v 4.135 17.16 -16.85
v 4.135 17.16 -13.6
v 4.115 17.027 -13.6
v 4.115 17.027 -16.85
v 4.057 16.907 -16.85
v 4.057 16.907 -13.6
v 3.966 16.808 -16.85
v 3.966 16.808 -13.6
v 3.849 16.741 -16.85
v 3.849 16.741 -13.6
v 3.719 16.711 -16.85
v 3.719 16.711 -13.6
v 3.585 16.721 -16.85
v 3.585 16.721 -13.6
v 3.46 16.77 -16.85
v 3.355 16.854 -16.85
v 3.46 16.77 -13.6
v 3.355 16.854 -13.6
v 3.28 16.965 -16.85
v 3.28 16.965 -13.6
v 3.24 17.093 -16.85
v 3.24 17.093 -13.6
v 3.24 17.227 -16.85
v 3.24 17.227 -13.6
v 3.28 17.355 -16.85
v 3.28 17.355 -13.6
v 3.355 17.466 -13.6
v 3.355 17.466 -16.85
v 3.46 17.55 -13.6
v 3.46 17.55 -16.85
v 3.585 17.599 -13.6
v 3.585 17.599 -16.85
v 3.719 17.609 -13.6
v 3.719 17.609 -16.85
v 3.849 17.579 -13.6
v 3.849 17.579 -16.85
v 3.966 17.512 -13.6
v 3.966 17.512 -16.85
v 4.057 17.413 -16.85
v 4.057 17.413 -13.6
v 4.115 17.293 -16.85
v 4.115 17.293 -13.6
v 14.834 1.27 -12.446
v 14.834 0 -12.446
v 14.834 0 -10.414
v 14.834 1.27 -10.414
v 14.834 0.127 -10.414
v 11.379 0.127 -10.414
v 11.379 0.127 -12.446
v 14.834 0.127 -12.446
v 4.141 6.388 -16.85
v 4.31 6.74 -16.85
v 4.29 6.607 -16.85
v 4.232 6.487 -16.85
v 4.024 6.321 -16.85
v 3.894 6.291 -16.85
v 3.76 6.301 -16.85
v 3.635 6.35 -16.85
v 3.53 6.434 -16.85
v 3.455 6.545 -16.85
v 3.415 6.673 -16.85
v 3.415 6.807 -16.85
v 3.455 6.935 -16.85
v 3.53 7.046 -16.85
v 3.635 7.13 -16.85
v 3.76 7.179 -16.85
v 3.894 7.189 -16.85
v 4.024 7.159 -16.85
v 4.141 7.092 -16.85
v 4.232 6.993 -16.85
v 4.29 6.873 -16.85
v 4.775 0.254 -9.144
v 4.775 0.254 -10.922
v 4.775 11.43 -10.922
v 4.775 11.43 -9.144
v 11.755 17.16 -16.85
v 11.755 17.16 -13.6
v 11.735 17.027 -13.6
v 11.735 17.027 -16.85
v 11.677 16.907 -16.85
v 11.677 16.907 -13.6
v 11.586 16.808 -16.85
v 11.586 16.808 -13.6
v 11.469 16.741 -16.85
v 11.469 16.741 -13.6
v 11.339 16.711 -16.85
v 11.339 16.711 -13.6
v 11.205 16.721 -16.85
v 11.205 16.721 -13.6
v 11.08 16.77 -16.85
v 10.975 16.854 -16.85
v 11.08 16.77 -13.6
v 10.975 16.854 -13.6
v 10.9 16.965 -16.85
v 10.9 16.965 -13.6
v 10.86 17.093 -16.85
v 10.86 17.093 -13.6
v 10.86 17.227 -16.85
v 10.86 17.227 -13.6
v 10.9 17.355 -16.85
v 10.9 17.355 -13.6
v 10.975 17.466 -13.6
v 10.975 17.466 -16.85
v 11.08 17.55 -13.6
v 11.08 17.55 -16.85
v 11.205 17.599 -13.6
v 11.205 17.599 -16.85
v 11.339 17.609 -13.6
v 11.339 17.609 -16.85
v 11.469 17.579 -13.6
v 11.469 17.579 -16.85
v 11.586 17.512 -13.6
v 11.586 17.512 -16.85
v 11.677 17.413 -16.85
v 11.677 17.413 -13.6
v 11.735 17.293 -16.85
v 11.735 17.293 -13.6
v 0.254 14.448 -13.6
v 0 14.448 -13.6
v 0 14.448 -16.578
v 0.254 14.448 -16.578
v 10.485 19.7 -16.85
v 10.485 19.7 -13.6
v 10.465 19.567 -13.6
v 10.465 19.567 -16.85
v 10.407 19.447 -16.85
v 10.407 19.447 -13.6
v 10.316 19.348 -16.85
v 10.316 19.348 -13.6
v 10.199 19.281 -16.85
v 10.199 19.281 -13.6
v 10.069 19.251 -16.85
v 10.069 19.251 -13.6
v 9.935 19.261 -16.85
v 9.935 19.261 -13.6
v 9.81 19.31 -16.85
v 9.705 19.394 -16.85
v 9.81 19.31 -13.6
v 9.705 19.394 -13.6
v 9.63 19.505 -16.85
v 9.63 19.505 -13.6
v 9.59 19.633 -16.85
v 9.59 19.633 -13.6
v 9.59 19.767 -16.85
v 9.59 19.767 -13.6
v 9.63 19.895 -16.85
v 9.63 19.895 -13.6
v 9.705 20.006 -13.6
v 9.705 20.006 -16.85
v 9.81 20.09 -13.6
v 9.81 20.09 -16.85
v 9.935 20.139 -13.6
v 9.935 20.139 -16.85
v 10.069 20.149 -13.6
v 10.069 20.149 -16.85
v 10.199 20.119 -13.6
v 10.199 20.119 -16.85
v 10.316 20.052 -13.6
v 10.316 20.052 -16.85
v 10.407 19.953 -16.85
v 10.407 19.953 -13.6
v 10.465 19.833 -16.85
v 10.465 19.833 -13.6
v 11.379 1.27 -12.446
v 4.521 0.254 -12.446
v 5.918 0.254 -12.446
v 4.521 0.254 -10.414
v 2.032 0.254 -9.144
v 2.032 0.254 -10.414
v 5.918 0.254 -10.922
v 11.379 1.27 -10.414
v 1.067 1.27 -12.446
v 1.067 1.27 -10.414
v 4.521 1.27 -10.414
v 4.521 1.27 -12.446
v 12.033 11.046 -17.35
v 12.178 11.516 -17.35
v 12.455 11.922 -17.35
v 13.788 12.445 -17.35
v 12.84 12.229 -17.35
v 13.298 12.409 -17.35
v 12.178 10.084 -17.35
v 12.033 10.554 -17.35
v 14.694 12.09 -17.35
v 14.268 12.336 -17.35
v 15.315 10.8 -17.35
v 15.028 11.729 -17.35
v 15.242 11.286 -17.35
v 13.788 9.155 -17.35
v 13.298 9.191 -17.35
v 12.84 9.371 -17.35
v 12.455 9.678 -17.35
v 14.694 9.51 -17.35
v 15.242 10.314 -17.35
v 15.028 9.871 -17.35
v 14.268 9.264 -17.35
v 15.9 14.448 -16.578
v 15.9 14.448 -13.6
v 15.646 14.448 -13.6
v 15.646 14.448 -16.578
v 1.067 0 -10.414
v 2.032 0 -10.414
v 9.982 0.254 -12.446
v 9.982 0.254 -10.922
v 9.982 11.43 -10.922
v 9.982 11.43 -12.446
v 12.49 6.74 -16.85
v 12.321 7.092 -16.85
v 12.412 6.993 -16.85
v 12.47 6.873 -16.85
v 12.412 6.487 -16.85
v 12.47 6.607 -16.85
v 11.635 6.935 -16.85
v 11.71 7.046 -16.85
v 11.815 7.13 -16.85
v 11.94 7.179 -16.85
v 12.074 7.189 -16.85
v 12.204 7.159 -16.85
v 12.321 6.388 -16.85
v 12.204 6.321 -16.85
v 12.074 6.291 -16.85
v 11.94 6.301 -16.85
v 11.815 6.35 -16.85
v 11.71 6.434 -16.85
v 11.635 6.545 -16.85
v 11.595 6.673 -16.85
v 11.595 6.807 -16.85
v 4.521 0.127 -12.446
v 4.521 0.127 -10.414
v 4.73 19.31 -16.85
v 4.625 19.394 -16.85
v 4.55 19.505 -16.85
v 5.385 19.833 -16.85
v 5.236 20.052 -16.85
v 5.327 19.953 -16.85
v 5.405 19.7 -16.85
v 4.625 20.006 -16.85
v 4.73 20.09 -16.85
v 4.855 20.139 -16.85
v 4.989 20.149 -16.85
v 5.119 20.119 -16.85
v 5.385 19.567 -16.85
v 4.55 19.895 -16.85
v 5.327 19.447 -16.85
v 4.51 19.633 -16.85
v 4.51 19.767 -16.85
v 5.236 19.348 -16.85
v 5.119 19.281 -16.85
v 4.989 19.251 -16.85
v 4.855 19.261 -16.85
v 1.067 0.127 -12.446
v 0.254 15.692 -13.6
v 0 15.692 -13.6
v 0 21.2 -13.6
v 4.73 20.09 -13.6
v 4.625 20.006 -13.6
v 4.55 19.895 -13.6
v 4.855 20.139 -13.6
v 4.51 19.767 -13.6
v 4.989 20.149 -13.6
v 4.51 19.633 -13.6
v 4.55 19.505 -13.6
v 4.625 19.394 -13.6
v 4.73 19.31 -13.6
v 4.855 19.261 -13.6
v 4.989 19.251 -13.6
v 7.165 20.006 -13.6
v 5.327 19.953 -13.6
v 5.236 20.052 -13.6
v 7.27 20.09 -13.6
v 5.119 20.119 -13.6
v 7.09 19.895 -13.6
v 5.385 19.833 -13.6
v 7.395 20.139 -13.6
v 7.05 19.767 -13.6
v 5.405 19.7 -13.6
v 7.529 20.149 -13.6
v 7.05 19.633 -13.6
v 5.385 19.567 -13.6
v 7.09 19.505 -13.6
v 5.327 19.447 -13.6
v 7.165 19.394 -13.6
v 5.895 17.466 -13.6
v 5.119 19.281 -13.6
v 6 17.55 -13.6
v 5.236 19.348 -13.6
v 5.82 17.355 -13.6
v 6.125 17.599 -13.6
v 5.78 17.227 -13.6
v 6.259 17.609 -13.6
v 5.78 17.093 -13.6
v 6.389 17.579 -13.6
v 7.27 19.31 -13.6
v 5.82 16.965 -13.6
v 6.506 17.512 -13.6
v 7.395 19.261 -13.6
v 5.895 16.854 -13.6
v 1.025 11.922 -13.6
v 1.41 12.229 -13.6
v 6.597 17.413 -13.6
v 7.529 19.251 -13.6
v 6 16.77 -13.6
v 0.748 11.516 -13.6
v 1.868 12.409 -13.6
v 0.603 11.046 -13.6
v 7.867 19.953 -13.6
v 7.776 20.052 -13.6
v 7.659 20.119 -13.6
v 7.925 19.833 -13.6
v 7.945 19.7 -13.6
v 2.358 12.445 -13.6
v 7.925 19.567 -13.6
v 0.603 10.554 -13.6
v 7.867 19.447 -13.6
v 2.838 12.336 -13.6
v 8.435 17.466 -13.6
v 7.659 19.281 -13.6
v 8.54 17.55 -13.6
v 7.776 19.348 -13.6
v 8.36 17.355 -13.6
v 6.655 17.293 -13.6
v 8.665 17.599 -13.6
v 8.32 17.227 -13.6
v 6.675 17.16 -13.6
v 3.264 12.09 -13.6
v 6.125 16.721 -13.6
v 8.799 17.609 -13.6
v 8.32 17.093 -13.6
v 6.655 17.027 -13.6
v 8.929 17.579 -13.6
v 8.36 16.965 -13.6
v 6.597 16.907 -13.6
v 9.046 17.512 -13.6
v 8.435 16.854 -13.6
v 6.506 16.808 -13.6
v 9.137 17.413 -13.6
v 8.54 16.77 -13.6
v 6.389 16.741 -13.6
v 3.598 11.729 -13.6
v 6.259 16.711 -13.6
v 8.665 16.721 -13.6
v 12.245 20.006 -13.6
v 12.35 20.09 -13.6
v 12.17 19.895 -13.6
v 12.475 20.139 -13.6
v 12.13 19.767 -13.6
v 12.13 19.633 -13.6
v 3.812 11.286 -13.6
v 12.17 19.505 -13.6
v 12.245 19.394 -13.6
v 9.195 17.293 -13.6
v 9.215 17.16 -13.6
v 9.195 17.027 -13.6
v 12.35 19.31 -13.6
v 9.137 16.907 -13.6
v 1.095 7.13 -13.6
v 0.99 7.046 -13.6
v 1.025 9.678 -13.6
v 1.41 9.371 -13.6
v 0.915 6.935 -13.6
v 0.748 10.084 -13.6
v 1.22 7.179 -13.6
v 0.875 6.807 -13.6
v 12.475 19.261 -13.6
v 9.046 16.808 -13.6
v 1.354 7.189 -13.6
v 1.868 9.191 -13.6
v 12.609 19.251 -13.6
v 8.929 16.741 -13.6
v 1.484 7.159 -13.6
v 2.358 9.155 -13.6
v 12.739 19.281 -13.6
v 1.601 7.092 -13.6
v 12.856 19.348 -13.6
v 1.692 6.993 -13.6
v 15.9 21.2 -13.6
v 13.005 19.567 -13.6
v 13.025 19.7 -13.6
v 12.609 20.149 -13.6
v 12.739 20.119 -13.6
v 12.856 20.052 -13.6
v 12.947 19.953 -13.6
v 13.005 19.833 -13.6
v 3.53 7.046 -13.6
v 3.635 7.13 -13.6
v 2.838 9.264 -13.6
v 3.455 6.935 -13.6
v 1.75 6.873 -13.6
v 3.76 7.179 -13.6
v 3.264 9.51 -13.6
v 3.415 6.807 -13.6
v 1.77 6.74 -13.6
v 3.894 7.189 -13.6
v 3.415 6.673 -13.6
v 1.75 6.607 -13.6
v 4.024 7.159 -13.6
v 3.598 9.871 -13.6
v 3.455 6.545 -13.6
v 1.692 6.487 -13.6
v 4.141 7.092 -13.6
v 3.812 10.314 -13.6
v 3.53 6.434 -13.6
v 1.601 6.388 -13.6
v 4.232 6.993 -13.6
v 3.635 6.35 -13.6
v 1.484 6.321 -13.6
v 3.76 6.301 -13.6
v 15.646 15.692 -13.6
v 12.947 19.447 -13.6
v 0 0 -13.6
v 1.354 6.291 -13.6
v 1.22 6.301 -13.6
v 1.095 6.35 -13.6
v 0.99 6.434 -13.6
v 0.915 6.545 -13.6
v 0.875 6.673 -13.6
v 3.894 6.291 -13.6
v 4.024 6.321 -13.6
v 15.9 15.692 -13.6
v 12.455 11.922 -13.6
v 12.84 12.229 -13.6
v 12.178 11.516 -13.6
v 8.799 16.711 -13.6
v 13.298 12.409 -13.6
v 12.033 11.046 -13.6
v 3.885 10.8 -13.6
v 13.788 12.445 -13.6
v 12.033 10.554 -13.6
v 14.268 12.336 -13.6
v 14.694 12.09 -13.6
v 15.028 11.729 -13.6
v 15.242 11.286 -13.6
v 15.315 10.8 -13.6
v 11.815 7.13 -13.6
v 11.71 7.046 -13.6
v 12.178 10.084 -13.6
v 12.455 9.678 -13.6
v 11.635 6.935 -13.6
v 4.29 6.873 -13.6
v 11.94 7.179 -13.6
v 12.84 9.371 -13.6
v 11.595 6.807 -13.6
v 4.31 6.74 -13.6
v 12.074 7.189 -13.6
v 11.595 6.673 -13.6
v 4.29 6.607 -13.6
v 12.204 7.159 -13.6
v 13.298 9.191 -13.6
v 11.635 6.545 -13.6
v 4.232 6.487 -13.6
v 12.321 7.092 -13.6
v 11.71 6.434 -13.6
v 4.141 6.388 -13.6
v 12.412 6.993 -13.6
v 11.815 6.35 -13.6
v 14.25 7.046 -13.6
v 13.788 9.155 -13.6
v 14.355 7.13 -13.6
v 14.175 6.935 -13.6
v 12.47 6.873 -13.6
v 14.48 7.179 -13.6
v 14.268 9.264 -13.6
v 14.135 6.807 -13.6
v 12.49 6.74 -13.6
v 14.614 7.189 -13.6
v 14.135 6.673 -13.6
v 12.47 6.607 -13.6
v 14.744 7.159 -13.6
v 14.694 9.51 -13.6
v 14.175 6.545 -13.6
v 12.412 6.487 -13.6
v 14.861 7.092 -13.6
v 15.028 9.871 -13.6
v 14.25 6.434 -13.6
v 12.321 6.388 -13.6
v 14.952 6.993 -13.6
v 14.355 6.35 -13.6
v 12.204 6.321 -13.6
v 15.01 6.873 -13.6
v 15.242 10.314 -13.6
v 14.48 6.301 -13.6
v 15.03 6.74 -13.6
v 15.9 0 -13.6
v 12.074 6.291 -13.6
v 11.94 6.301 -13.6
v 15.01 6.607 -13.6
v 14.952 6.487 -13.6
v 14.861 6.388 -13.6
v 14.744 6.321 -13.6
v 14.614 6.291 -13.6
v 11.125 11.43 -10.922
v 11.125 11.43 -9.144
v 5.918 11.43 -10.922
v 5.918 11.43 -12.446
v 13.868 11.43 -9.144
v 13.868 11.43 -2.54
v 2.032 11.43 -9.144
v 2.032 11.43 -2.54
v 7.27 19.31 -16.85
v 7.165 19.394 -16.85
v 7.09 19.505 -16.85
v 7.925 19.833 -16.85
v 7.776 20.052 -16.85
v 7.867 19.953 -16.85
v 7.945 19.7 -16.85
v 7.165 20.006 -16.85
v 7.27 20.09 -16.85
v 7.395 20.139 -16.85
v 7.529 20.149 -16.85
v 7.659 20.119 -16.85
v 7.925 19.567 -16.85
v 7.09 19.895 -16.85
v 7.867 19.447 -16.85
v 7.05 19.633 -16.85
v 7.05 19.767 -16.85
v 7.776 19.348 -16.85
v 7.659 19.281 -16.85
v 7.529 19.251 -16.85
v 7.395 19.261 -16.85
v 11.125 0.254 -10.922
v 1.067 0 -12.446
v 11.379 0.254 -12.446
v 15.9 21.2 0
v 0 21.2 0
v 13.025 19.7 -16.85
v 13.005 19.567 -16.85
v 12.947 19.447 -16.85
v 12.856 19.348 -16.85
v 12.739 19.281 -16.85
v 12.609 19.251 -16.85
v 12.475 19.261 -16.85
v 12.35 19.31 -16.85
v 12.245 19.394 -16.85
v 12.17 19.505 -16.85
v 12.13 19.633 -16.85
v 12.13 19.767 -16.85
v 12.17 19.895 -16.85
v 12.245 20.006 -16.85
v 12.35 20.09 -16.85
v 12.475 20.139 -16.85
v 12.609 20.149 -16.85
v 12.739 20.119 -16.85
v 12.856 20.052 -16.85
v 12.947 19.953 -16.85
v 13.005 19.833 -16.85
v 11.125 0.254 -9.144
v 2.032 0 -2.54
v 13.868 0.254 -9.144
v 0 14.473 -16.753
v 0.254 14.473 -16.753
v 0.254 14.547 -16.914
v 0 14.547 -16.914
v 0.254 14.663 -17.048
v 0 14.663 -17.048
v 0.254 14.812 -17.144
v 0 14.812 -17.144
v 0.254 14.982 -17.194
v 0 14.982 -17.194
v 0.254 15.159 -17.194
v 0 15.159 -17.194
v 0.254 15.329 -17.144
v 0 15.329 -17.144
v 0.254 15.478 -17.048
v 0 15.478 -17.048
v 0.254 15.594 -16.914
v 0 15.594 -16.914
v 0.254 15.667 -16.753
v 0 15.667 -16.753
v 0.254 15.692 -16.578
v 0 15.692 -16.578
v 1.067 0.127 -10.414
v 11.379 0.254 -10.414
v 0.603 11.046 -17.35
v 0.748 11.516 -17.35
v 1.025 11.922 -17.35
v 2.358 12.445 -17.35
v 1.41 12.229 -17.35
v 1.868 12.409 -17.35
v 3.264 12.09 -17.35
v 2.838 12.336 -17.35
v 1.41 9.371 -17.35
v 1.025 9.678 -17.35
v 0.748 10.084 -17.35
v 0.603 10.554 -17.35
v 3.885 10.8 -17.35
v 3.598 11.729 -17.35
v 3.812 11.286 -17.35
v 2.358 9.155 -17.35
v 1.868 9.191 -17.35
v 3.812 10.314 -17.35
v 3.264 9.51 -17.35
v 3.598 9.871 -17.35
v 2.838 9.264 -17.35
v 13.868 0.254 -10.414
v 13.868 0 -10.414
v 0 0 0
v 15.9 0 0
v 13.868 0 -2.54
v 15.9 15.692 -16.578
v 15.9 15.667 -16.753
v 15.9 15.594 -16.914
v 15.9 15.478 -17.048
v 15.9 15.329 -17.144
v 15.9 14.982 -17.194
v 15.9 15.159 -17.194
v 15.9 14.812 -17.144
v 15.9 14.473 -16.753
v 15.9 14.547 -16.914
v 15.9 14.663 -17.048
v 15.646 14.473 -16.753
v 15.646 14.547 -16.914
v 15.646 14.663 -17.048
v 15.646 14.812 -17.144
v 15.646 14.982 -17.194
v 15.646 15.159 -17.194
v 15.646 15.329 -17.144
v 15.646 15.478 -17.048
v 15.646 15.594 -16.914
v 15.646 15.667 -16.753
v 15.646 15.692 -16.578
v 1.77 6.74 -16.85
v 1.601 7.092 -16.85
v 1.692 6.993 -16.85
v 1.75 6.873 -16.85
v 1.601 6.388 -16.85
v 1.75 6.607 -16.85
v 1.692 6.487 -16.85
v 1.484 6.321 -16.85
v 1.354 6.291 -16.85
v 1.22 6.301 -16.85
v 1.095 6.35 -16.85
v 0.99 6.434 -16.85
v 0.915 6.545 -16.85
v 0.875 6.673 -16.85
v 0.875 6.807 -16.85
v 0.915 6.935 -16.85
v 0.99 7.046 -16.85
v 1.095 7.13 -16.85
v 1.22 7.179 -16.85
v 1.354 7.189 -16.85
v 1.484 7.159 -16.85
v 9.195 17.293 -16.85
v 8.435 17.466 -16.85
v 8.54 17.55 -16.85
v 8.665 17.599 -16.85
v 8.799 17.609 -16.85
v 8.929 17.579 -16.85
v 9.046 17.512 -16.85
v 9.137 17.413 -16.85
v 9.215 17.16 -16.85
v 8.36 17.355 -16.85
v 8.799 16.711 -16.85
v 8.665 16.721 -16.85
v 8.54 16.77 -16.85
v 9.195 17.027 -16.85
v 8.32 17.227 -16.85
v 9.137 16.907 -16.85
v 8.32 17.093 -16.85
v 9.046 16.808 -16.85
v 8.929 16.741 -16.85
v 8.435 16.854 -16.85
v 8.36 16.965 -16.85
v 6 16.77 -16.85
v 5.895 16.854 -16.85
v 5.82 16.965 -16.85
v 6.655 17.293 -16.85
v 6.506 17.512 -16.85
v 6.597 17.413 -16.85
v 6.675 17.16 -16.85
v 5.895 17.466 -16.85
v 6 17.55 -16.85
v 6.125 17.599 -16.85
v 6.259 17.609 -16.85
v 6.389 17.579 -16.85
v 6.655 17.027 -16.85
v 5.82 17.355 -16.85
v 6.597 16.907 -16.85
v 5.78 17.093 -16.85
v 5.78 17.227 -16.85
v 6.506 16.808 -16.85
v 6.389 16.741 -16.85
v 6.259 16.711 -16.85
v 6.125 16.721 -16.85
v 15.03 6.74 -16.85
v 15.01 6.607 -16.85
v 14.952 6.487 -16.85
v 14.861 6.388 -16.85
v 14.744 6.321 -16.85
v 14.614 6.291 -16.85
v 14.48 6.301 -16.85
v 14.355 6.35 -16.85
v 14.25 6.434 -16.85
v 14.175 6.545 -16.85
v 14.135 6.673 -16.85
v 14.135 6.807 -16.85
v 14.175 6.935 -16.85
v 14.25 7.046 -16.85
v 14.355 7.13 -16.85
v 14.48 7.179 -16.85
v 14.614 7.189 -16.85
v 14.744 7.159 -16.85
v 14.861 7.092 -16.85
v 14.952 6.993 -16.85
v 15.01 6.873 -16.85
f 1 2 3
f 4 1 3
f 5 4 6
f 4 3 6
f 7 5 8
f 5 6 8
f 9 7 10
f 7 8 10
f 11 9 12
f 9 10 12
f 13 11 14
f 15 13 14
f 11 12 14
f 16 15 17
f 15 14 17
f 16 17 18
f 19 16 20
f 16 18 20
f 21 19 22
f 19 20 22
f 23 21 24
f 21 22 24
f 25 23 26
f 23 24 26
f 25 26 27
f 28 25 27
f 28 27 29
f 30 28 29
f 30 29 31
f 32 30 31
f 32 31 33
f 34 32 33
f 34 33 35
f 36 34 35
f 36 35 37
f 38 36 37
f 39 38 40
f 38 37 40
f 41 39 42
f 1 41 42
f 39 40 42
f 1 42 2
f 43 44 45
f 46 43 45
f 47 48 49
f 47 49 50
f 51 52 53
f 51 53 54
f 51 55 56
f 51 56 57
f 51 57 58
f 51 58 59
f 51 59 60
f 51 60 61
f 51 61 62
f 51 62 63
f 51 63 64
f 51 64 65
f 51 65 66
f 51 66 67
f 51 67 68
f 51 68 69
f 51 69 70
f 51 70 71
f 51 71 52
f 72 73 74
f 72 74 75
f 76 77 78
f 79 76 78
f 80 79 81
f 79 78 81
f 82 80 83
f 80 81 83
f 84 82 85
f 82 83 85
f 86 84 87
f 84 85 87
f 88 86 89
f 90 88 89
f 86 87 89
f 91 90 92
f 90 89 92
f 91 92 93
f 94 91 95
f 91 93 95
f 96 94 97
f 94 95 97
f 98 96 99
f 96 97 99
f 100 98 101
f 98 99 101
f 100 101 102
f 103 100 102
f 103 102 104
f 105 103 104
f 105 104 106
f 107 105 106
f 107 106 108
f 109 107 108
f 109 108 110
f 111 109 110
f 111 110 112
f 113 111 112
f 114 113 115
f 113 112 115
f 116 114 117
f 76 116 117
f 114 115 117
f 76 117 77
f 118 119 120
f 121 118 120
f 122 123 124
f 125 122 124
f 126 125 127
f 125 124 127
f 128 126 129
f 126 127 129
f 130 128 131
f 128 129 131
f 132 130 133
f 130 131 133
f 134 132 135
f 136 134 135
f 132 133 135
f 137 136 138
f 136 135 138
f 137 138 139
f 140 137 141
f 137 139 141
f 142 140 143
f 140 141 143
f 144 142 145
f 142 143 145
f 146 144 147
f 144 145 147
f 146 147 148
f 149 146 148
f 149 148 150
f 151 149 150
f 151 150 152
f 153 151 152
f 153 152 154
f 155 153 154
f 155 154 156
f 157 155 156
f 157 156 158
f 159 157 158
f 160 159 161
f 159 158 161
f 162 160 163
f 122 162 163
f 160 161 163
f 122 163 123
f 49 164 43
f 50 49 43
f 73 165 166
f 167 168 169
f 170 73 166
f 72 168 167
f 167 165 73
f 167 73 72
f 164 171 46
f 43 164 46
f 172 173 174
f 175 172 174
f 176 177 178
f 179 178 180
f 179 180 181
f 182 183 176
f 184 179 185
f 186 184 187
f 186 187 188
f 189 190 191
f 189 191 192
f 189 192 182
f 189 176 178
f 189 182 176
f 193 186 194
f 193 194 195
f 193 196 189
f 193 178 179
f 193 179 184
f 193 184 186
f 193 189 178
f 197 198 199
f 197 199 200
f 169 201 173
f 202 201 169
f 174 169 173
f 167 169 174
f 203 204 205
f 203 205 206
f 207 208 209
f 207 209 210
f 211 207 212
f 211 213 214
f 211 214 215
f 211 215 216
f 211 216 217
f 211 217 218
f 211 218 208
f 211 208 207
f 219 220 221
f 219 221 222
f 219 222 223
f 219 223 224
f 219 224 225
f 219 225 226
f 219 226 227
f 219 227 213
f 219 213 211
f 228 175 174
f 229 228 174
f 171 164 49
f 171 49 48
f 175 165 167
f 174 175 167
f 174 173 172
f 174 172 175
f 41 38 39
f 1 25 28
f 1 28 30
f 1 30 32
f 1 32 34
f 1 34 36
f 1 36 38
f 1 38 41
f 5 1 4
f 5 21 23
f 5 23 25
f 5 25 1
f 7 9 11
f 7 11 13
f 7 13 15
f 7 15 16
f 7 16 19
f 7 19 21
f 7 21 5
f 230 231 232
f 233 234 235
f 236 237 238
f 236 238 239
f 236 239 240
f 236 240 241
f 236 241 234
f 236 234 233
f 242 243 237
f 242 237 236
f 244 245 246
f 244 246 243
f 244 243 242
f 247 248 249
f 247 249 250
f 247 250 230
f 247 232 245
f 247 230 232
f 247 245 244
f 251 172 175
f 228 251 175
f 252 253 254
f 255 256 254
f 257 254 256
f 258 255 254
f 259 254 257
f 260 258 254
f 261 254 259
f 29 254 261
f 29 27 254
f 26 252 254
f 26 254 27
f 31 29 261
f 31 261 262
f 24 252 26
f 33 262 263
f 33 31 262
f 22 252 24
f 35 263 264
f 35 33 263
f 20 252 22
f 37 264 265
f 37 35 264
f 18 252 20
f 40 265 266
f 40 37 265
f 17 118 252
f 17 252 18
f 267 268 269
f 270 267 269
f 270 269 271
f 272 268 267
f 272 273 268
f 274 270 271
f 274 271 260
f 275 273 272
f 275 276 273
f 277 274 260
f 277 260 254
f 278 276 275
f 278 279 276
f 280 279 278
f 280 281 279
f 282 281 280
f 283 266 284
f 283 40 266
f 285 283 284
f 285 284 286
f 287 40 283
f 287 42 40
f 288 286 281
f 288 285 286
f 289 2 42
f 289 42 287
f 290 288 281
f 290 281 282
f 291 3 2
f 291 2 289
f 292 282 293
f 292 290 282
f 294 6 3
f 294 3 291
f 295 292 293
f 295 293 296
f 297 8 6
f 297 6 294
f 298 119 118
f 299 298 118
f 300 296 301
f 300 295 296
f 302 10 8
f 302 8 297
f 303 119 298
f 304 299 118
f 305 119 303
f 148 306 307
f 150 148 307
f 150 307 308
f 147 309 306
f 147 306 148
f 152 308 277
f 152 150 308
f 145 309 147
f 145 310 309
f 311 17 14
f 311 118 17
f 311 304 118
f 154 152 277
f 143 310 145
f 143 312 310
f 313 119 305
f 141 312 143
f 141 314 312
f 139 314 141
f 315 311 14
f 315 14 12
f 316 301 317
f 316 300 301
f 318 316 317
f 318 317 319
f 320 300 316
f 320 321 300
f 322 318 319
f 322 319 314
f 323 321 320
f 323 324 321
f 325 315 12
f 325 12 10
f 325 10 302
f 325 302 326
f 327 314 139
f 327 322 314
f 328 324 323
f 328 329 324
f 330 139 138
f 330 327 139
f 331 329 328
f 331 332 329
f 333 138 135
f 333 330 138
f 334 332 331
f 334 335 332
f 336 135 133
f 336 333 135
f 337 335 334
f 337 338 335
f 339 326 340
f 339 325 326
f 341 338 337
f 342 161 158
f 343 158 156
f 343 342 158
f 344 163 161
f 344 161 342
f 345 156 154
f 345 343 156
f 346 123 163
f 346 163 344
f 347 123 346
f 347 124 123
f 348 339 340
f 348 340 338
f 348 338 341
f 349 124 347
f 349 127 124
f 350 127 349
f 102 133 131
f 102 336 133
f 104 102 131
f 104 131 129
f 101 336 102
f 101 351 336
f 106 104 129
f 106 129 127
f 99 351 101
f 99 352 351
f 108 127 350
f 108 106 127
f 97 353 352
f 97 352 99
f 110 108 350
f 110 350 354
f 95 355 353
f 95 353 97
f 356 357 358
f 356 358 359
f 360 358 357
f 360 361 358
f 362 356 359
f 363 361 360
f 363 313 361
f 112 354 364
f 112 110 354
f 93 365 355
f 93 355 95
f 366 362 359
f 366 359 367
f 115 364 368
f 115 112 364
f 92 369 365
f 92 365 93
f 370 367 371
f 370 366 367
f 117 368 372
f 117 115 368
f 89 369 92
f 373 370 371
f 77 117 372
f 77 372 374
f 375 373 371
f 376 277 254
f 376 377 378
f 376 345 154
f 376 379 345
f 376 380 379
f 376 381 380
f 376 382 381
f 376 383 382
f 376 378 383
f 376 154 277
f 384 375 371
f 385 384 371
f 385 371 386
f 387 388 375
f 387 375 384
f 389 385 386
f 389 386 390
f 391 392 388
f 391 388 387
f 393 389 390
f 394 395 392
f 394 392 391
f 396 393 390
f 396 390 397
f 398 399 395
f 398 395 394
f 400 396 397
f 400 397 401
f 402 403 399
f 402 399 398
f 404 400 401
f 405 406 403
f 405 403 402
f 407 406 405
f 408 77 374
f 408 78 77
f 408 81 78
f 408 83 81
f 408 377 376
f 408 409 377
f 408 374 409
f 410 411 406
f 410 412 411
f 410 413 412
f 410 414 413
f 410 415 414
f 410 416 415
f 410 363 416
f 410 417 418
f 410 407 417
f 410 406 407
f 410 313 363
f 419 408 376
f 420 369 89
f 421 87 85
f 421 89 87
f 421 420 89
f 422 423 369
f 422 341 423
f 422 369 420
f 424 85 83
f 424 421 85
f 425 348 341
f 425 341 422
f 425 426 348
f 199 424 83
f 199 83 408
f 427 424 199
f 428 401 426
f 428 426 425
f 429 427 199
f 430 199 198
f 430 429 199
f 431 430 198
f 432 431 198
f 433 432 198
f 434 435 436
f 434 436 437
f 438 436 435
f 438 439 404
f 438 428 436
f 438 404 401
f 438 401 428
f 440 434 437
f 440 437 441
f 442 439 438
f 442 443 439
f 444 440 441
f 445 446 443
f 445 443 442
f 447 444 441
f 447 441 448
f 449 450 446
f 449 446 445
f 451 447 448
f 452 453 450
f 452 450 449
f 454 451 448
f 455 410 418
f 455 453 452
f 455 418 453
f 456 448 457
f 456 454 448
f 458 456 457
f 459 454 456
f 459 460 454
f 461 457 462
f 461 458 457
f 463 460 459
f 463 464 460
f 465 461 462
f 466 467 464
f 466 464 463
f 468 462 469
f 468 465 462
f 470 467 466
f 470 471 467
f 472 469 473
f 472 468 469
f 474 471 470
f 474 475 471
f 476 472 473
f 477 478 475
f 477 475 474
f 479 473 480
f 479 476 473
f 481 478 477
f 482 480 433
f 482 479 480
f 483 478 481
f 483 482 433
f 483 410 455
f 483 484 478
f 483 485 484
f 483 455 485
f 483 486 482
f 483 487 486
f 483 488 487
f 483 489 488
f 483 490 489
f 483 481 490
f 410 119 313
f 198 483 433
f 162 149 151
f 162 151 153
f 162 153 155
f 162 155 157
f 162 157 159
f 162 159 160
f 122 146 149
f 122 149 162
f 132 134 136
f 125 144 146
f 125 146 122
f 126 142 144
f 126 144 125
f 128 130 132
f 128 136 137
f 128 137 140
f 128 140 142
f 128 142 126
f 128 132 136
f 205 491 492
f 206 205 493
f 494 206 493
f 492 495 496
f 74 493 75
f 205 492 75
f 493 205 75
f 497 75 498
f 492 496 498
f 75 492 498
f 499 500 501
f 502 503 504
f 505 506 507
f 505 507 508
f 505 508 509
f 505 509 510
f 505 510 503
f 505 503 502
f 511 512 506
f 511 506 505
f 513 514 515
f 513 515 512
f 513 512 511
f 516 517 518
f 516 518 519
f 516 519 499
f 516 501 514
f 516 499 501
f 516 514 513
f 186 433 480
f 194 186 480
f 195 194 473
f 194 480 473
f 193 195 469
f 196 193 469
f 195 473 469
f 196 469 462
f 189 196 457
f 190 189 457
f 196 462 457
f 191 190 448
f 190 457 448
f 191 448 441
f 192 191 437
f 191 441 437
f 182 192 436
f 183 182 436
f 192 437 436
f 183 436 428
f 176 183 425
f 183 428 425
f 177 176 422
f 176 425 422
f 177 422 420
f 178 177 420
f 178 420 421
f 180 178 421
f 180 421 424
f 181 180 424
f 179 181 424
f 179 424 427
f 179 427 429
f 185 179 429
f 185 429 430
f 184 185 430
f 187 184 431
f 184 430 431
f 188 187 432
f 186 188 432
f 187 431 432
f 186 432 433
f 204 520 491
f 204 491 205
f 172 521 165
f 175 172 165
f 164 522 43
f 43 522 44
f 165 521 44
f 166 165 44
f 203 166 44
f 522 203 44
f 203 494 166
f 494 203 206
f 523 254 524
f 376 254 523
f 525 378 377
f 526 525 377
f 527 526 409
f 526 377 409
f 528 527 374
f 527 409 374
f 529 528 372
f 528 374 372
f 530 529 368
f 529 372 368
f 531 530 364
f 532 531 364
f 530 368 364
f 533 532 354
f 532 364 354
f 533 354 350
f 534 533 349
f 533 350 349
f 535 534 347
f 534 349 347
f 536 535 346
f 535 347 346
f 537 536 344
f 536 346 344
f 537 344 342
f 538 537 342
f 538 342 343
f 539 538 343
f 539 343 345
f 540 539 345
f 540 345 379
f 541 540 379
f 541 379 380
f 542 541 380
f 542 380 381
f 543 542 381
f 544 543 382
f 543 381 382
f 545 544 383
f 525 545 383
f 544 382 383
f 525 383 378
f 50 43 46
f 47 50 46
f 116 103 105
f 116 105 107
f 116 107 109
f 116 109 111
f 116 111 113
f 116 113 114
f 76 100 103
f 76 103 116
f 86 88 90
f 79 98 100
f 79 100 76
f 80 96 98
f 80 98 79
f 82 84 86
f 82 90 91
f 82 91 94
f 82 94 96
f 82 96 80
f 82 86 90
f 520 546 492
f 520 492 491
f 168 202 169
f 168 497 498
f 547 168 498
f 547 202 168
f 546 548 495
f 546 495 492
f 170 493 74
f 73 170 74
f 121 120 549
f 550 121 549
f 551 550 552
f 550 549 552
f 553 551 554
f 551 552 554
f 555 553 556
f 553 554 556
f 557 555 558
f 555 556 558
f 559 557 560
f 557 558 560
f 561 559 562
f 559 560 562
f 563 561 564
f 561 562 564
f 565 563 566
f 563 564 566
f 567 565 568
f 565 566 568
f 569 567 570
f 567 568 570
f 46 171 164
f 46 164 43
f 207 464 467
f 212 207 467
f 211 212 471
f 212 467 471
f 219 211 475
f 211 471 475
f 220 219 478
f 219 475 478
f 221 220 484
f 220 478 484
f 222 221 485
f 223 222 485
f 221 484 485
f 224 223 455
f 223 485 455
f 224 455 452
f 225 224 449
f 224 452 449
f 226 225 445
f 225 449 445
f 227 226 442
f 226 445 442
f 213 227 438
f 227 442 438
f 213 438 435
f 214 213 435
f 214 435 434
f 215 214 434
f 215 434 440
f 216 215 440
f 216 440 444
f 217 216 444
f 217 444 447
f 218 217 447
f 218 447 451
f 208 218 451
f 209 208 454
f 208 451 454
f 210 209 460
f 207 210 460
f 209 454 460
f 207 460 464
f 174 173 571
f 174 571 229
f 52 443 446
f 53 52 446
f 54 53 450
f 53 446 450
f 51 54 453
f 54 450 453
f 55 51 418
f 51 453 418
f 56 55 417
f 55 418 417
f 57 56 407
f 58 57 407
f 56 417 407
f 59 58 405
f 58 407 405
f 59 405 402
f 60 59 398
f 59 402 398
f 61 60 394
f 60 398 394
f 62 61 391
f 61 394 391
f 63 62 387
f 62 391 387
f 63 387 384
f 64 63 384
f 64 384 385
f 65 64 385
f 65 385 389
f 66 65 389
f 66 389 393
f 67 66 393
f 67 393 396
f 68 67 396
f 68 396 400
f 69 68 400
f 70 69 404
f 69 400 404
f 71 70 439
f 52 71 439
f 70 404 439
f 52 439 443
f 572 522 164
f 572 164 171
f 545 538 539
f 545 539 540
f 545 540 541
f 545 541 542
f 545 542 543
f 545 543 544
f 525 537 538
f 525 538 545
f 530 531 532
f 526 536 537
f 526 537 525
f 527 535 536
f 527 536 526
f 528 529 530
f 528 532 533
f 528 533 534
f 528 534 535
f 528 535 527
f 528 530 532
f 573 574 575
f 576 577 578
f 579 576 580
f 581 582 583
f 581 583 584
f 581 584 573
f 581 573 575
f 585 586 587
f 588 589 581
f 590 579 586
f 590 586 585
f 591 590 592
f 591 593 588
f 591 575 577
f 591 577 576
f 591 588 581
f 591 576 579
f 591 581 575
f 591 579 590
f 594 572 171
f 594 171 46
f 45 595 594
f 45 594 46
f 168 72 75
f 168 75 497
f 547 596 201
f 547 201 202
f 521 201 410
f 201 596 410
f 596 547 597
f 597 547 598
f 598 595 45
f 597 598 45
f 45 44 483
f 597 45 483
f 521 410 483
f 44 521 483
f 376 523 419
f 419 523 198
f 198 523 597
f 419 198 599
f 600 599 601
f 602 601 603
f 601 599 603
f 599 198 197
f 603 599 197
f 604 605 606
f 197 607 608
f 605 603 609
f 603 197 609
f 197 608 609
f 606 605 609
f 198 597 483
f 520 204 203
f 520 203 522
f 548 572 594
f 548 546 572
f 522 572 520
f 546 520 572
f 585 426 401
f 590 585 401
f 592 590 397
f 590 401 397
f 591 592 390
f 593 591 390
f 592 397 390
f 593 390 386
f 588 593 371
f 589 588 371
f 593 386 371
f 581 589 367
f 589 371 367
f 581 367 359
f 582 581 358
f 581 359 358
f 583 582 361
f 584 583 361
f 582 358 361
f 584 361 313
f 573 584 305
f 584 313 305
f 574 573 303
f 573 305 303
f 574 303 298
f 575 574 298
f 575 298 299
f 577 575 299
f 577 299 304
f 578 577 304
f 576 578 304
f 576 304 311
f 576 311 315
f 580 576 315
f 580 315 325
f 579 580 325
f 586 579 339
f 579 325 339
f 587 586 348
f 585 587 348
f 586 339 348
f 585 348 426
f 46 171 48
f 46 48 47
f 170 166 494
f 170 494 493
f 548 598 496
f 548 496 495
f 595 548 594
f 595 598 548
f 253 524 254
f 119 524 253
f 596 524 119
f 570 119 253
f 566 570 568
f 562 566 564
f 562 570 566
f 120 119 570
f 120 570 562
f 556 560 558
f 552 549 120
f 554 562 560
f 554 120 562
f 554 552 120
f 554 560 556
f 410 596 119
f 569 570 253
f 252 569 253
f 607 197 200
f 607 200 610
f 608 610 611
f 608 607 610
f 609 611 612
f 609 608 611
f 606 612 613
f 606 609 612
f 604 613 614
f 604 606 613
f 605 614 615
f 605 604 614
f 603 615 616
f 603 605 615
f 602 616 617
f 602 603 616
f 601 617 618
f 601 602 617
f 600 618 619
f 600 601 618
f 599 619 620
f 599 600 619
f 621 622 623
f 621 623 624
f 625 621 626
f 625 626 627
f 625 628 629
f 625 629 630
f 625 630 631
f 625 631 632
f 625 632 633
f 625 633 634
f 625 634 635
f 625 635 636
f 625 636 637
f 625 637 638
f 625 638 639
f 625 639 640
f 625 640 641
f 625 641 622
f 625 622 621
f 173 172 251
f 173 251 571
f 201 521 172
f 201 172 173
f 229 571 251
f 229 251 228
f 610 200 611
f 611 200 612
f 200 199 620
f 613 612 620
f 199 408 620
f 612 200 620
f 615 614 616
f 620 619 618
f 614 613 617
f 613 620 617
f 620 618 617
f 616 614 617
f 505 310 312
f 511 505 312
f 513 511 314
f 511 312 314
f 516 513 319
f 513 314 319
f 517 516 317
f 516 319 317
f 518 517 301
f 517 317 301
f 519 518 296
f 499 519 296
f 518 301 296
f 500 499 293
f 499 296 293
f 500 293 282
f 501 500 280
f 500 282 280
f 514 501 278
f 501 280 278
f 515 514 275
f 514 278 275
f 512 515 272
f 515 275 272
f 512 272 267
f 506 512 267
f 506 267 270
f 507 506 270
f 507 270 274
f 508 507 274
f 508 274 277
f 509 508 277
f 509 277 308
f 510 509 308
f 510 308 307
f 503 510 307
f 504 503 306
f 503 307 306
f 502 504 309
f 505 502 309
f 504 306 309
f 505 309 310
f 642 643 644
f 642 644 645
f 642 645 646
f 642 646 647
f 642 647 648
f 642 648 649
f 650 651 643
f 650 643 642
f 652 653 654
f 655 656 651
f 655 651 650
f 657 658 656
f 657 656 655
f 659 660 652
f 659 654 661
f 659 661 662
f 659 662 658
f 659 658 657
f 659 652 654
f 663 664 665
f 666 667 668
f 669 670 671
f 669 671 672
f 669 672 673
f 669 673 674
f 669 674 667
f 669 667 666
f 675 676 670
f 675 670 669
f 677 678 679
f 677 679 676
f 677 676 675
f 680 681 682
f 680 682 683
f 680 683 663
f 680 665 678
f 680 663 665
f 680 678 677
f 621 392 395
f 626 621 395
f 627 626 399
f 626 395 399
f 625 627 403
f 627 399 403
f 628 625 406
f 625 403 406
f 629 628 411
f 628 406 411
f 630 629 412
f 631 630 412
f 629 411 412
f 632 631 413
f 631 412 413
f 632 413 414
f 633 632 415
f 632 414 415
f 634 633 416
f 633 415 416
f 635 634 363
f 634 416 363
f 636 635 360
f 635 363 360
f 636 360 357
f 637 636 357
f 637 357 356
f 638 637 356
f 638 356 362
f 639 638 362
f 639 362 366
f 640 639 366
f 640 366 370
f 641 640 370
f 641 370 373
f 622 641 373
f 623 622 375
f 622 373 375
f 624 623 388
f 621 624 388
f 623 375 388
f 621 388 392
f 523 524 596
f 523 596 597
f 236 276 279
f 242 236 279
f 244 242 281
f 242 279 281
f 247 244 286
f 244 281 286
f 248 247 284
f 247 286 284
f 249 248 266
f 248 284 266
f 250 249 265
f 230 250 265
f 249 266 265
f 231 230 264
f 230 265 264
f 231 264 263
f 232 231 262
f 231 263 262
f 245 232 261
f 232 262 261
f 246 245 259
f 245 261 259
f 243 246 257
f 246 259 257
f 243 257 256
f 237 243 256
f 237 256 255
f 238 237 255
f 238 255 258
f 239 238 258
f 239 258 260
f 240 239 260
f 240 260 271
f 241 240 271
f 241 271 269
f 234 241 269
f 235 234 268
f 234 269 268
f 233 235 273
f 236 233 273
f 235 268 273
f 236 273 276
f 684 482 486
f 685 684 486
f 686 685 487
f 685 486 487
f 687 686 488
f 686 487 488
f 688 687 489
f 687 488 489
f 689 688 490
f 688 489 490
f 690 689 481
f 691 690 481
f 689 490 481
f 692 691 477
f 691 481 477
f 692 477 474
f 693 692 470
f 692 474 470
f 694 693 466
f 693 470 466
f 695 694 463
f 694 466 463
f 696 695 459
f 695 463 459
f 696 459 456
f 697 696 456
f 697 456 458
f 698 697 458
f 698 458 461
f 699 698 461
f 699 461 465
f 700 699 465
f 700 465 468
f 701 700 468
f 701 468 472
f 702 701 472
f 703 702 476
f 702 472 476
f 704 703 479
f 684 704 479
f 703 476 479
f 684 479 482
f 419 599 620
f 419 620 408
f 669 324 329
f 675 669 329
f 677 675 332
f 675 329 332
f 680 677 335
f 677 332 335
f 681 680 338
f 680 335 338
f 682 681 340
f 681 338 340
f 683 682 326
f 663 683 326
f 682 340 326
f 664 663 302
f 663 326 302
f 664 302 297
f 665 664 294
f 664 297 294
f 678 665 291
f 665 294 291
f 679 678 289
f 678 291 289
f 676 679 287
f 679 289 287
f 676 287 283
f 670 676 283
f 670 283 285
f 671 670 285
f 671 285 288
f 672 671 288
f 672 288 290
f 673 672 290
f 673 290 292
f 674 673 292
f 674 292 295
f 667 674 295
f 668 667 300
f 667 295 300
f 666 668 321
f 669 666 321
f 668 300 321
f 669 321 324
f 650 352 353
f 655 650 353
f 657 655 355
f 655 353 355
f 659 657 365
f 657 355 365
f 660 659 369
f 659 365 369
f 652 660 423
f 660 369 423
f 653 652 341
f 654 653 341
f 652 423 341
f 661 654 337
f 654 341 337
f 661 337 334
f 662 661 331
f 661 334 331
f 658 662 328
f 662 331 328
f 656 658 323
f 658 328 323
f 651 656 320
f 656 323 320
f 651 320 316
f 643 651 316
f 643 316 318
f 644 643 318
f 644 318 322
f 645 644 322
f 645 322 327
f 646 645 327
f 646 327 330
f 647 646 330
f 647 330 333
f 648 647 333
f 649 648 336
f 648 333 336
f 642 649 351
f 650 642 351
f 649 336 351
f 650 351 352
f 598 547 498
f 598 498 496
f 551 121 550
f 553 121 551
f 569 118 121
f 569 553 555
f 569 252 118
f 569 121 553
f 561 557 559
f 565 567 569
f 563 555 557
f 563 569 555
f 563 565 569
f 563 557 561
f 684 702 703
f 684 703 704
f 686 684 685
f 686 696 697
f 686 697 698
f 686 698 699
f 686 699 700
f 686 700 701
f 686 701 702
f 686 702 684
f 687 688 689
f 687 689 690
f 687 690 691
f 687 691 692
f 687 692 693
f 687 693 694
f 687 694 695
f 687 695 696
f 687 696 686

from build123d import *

# Parameters (mm, degrees)
SKETCH1_W           = 15.9
SKETCH1_H           = 13.6
BOSS_EXTRUDE1_DEPTH = 21.2
SKETCH2_R           = 1.65
BOSS_EXTRUDE2_DEPTH = 3.75
CUT_EXTRUDE1_DEPTH  = 11.43
SKETCH4_W           = 11.8364
SKETCH4_H           = 9.906
CUT_EXTRUDE2_DEPTH  = 0.254
SKETCH7_W           = 3.4544
SKETCH7_H           = 2.032
CUT_EXTRUDE3_DEPTH  = 1.27
SKETCH8_W           = 3.4544
SKETCH8_H           = 2.032
BOSS_EXTRUDE3_DEPTH = 1.143
SKETCH9_W           = 3.4544
SKETCH9_H           = 2.032
BOSS_EXTRUDE4_DEPTH = 1.143
BOSS_EXTRUDE5_DEPTH = 0.254
SKETCH11_R          = 0.45
BOSS_EXTRUDE6_DEPTH = 3.25
SKETCH12_R          = 0.45
BOSS_EXTRUDE7_DEPTH = 3.25


with BuildPart() as part:
    # Sketch1 → Boss-Extrude1 (new body)
    with BuildSketch(Plane(origin=(0, 0, 0), x_dir=(1, 0, 0), z_dir=(0, 1, 0))):
        with Locations((7.95, 6.8)):
            Rectangle(SKETCH1_W, SKETCH1_H)
    extrude(amount=BOSS_EXTRUDE1_DEPTH)

    # Sketch2 → Boss-Extrude2 (add)
    with BuildSketch(Plane(origin=(0, 0, -13.6), x_dir=(-1, 0, 0), z_dir=(0, 0, -1))):
        with Locations(Location((-13.665, 10.8, 0), (0, 0, 180))):
            Circle(SKETCH2_R)
        with Locations(Location((-2.235, 10.8, 0), (0, 0, 180))):
            Circle(SKETCH2_R)
    extrude(amount=BOSS_EXTRUDE2_DEPTH)

    # Sketch3 → Cut-Extrude1 (cut)
    with BuildSketch(Plane.XZ):
        Polygon((2.032, -2.54), (13.8684, -2.54), (13.8684, -9.144), (11.1252, -9.144), (11.1252, -10.922), (9.9822, -10.922), (9.9822, -12.446), (5.9182, -12.446), (5.9182, -10.922), (4.7752, -10.922), (4.7752, -9.144), (2.032, -9.144), align=None)
    extrude(amount=-CUT_EXTRUDE1_DEPTH, mode=Mode.SUBTRACT)

    # Sketch4 → Cut-Extrude2 (cut)
    with BuildSketch(Plane.XZ):
        with Locations((7.9502, -7.493)):
            Rectangle(SKETCH4_W, SKETCH4_H)
    extrude(amount=-CUT_EXTRUDE2_DEPTH, mode=Mode.SUBTRACT)

    # Sketch7 → Cut-Extrude3 (cut)
    with BuildSketch(Plane.XZ):
        with Locations((2.794, -11.43)):
            Rectangle(SKETCH7_W, SKETCH7_H)
        with Locations((13.1064, -11.43)):
            Rectangle(SKETCH7_W, SKETCH7_H)
    extrude(amount=-CUT_EXTRUDE3_DEPTH, mode=Mode.SUBTRACT)

    # Sketch10 → Boss-Extrude5 (add)
    with BuildSketch(Plane.ZY):
        with BuildLine():
            Line((-13.6, 14.447874496), (-16.5777, 14.447874496))
            ThreePointArc((-16.5777, 14.447874496), (-17.2, 15.070174496), (-16.5777, 15.692474496))
            Line((-16.5777, 15.692474496), (-13.6, 15.692474496))
            Line((-13.6, 15.692474496), (-13.6, 14.447874496))
        make_face()
    boss_extrude5 = extrude(amount=-BOSS_EXTRUDE5_DEPTH)

    # Mirror2: Boss-Extrude5 across plane
    add(boss_extrude5.mirror(Plane(origin=(7.95, 0, 0), x_dir=(0, 0, 1), z_dir=(1, 0, 0))))

    # Sketch11 → Boss-Extrude6 (add)
    with BuildSketch(Plane(origin=(0, 0, -13.6), x_dir=(-1, 0, 0), z_dir=(0, 0, -1))):
        with Locations(Location((-14.58, 6.74, 0), (0, 0, 180))):
            Circle(SKETCH11_R)
        with Locations(Location((-12.04, 6.74, 0), (0, 0, 180))):
            Circle(SKETCH11_R)
        with Locations(Location((-3.86, 6.74, 0), (0, 0, 180))):
            Circle(SKETCH11_R)
        with Locations(Location((-1.32, 6.74, 0), (0, 0, 180))):
            Circle(SKETCH11_R)
    extrude(amount=BOSS_EXTRUDE6_DEPTH)

    # Sketch12 → Boss-Extrude7 (add)
    with BuildSketch(Plane(origin=(0, 0, -13.6), x_dir=(-1, 0, 0), z_dir=(0, 0, -1))):
        with Locations(Location((-3.685, 17.16, 0), (0, 0, 180))):
            Circle(SKETCH12_R)
        with Locations(Location((-6.225, 17.16, 0), (0, 0, 180))):
            Circle(SKETCH12_R)
        with Locations(Location((-8.765, 17.16, 0), (0, 0, 180))):
            Circle(SKETCH12_R)
        with Locations(Location((-11.305, 17.16, 0), (0, 0, 180))):
            Circle(SKETCH12_R)
        with Locations(Location((-4.955, 19.7, 0), (0, 0, 180))):
            Circle(SKETCH12_R)
        with Locations(Location((-7.495, 19.7, 0), (0, 0, 180))):
            Circle(SKETCH12_R)
        with Locations(Location((-10.035, 19.7, 0), (0, 0, 180))):
            Circle(SKETCH12_R)
        with Locations(Location((-12.575, 19.7, 0), (0, 0, 180))):
            Circle(SKETCH12_R)
    extrude(amount=BOSS_EXTRUDE7_DEPTH)


with BuildPart() as body_2:
    # Sketch8 → Boss-Extrude3 (new body)
    with BuildSketch(Plane.XZ.offset(-1.27)):
        with Locations((2.794, -11.43)):
            Rectangle(SKETCH8_W, SKETCH8_H)
    extrude(amount=BOSS_EXTRUDE3_DEPTH)


with BuildPart() as body_3:
    # Sketch9 → Boss-Extrude4 (new body)
    with BuildSketch(Plane.XZ.offset(-1.27)):
        with Locations((13.1064, -11.43)):
            Rectangle(SKETCH9_W, SKETCH9_H)
    extrude(amount=BOSS_EXTRUDE4_DEPTH)


solid = Compound([part.part, body_2.part, body_3.part])
